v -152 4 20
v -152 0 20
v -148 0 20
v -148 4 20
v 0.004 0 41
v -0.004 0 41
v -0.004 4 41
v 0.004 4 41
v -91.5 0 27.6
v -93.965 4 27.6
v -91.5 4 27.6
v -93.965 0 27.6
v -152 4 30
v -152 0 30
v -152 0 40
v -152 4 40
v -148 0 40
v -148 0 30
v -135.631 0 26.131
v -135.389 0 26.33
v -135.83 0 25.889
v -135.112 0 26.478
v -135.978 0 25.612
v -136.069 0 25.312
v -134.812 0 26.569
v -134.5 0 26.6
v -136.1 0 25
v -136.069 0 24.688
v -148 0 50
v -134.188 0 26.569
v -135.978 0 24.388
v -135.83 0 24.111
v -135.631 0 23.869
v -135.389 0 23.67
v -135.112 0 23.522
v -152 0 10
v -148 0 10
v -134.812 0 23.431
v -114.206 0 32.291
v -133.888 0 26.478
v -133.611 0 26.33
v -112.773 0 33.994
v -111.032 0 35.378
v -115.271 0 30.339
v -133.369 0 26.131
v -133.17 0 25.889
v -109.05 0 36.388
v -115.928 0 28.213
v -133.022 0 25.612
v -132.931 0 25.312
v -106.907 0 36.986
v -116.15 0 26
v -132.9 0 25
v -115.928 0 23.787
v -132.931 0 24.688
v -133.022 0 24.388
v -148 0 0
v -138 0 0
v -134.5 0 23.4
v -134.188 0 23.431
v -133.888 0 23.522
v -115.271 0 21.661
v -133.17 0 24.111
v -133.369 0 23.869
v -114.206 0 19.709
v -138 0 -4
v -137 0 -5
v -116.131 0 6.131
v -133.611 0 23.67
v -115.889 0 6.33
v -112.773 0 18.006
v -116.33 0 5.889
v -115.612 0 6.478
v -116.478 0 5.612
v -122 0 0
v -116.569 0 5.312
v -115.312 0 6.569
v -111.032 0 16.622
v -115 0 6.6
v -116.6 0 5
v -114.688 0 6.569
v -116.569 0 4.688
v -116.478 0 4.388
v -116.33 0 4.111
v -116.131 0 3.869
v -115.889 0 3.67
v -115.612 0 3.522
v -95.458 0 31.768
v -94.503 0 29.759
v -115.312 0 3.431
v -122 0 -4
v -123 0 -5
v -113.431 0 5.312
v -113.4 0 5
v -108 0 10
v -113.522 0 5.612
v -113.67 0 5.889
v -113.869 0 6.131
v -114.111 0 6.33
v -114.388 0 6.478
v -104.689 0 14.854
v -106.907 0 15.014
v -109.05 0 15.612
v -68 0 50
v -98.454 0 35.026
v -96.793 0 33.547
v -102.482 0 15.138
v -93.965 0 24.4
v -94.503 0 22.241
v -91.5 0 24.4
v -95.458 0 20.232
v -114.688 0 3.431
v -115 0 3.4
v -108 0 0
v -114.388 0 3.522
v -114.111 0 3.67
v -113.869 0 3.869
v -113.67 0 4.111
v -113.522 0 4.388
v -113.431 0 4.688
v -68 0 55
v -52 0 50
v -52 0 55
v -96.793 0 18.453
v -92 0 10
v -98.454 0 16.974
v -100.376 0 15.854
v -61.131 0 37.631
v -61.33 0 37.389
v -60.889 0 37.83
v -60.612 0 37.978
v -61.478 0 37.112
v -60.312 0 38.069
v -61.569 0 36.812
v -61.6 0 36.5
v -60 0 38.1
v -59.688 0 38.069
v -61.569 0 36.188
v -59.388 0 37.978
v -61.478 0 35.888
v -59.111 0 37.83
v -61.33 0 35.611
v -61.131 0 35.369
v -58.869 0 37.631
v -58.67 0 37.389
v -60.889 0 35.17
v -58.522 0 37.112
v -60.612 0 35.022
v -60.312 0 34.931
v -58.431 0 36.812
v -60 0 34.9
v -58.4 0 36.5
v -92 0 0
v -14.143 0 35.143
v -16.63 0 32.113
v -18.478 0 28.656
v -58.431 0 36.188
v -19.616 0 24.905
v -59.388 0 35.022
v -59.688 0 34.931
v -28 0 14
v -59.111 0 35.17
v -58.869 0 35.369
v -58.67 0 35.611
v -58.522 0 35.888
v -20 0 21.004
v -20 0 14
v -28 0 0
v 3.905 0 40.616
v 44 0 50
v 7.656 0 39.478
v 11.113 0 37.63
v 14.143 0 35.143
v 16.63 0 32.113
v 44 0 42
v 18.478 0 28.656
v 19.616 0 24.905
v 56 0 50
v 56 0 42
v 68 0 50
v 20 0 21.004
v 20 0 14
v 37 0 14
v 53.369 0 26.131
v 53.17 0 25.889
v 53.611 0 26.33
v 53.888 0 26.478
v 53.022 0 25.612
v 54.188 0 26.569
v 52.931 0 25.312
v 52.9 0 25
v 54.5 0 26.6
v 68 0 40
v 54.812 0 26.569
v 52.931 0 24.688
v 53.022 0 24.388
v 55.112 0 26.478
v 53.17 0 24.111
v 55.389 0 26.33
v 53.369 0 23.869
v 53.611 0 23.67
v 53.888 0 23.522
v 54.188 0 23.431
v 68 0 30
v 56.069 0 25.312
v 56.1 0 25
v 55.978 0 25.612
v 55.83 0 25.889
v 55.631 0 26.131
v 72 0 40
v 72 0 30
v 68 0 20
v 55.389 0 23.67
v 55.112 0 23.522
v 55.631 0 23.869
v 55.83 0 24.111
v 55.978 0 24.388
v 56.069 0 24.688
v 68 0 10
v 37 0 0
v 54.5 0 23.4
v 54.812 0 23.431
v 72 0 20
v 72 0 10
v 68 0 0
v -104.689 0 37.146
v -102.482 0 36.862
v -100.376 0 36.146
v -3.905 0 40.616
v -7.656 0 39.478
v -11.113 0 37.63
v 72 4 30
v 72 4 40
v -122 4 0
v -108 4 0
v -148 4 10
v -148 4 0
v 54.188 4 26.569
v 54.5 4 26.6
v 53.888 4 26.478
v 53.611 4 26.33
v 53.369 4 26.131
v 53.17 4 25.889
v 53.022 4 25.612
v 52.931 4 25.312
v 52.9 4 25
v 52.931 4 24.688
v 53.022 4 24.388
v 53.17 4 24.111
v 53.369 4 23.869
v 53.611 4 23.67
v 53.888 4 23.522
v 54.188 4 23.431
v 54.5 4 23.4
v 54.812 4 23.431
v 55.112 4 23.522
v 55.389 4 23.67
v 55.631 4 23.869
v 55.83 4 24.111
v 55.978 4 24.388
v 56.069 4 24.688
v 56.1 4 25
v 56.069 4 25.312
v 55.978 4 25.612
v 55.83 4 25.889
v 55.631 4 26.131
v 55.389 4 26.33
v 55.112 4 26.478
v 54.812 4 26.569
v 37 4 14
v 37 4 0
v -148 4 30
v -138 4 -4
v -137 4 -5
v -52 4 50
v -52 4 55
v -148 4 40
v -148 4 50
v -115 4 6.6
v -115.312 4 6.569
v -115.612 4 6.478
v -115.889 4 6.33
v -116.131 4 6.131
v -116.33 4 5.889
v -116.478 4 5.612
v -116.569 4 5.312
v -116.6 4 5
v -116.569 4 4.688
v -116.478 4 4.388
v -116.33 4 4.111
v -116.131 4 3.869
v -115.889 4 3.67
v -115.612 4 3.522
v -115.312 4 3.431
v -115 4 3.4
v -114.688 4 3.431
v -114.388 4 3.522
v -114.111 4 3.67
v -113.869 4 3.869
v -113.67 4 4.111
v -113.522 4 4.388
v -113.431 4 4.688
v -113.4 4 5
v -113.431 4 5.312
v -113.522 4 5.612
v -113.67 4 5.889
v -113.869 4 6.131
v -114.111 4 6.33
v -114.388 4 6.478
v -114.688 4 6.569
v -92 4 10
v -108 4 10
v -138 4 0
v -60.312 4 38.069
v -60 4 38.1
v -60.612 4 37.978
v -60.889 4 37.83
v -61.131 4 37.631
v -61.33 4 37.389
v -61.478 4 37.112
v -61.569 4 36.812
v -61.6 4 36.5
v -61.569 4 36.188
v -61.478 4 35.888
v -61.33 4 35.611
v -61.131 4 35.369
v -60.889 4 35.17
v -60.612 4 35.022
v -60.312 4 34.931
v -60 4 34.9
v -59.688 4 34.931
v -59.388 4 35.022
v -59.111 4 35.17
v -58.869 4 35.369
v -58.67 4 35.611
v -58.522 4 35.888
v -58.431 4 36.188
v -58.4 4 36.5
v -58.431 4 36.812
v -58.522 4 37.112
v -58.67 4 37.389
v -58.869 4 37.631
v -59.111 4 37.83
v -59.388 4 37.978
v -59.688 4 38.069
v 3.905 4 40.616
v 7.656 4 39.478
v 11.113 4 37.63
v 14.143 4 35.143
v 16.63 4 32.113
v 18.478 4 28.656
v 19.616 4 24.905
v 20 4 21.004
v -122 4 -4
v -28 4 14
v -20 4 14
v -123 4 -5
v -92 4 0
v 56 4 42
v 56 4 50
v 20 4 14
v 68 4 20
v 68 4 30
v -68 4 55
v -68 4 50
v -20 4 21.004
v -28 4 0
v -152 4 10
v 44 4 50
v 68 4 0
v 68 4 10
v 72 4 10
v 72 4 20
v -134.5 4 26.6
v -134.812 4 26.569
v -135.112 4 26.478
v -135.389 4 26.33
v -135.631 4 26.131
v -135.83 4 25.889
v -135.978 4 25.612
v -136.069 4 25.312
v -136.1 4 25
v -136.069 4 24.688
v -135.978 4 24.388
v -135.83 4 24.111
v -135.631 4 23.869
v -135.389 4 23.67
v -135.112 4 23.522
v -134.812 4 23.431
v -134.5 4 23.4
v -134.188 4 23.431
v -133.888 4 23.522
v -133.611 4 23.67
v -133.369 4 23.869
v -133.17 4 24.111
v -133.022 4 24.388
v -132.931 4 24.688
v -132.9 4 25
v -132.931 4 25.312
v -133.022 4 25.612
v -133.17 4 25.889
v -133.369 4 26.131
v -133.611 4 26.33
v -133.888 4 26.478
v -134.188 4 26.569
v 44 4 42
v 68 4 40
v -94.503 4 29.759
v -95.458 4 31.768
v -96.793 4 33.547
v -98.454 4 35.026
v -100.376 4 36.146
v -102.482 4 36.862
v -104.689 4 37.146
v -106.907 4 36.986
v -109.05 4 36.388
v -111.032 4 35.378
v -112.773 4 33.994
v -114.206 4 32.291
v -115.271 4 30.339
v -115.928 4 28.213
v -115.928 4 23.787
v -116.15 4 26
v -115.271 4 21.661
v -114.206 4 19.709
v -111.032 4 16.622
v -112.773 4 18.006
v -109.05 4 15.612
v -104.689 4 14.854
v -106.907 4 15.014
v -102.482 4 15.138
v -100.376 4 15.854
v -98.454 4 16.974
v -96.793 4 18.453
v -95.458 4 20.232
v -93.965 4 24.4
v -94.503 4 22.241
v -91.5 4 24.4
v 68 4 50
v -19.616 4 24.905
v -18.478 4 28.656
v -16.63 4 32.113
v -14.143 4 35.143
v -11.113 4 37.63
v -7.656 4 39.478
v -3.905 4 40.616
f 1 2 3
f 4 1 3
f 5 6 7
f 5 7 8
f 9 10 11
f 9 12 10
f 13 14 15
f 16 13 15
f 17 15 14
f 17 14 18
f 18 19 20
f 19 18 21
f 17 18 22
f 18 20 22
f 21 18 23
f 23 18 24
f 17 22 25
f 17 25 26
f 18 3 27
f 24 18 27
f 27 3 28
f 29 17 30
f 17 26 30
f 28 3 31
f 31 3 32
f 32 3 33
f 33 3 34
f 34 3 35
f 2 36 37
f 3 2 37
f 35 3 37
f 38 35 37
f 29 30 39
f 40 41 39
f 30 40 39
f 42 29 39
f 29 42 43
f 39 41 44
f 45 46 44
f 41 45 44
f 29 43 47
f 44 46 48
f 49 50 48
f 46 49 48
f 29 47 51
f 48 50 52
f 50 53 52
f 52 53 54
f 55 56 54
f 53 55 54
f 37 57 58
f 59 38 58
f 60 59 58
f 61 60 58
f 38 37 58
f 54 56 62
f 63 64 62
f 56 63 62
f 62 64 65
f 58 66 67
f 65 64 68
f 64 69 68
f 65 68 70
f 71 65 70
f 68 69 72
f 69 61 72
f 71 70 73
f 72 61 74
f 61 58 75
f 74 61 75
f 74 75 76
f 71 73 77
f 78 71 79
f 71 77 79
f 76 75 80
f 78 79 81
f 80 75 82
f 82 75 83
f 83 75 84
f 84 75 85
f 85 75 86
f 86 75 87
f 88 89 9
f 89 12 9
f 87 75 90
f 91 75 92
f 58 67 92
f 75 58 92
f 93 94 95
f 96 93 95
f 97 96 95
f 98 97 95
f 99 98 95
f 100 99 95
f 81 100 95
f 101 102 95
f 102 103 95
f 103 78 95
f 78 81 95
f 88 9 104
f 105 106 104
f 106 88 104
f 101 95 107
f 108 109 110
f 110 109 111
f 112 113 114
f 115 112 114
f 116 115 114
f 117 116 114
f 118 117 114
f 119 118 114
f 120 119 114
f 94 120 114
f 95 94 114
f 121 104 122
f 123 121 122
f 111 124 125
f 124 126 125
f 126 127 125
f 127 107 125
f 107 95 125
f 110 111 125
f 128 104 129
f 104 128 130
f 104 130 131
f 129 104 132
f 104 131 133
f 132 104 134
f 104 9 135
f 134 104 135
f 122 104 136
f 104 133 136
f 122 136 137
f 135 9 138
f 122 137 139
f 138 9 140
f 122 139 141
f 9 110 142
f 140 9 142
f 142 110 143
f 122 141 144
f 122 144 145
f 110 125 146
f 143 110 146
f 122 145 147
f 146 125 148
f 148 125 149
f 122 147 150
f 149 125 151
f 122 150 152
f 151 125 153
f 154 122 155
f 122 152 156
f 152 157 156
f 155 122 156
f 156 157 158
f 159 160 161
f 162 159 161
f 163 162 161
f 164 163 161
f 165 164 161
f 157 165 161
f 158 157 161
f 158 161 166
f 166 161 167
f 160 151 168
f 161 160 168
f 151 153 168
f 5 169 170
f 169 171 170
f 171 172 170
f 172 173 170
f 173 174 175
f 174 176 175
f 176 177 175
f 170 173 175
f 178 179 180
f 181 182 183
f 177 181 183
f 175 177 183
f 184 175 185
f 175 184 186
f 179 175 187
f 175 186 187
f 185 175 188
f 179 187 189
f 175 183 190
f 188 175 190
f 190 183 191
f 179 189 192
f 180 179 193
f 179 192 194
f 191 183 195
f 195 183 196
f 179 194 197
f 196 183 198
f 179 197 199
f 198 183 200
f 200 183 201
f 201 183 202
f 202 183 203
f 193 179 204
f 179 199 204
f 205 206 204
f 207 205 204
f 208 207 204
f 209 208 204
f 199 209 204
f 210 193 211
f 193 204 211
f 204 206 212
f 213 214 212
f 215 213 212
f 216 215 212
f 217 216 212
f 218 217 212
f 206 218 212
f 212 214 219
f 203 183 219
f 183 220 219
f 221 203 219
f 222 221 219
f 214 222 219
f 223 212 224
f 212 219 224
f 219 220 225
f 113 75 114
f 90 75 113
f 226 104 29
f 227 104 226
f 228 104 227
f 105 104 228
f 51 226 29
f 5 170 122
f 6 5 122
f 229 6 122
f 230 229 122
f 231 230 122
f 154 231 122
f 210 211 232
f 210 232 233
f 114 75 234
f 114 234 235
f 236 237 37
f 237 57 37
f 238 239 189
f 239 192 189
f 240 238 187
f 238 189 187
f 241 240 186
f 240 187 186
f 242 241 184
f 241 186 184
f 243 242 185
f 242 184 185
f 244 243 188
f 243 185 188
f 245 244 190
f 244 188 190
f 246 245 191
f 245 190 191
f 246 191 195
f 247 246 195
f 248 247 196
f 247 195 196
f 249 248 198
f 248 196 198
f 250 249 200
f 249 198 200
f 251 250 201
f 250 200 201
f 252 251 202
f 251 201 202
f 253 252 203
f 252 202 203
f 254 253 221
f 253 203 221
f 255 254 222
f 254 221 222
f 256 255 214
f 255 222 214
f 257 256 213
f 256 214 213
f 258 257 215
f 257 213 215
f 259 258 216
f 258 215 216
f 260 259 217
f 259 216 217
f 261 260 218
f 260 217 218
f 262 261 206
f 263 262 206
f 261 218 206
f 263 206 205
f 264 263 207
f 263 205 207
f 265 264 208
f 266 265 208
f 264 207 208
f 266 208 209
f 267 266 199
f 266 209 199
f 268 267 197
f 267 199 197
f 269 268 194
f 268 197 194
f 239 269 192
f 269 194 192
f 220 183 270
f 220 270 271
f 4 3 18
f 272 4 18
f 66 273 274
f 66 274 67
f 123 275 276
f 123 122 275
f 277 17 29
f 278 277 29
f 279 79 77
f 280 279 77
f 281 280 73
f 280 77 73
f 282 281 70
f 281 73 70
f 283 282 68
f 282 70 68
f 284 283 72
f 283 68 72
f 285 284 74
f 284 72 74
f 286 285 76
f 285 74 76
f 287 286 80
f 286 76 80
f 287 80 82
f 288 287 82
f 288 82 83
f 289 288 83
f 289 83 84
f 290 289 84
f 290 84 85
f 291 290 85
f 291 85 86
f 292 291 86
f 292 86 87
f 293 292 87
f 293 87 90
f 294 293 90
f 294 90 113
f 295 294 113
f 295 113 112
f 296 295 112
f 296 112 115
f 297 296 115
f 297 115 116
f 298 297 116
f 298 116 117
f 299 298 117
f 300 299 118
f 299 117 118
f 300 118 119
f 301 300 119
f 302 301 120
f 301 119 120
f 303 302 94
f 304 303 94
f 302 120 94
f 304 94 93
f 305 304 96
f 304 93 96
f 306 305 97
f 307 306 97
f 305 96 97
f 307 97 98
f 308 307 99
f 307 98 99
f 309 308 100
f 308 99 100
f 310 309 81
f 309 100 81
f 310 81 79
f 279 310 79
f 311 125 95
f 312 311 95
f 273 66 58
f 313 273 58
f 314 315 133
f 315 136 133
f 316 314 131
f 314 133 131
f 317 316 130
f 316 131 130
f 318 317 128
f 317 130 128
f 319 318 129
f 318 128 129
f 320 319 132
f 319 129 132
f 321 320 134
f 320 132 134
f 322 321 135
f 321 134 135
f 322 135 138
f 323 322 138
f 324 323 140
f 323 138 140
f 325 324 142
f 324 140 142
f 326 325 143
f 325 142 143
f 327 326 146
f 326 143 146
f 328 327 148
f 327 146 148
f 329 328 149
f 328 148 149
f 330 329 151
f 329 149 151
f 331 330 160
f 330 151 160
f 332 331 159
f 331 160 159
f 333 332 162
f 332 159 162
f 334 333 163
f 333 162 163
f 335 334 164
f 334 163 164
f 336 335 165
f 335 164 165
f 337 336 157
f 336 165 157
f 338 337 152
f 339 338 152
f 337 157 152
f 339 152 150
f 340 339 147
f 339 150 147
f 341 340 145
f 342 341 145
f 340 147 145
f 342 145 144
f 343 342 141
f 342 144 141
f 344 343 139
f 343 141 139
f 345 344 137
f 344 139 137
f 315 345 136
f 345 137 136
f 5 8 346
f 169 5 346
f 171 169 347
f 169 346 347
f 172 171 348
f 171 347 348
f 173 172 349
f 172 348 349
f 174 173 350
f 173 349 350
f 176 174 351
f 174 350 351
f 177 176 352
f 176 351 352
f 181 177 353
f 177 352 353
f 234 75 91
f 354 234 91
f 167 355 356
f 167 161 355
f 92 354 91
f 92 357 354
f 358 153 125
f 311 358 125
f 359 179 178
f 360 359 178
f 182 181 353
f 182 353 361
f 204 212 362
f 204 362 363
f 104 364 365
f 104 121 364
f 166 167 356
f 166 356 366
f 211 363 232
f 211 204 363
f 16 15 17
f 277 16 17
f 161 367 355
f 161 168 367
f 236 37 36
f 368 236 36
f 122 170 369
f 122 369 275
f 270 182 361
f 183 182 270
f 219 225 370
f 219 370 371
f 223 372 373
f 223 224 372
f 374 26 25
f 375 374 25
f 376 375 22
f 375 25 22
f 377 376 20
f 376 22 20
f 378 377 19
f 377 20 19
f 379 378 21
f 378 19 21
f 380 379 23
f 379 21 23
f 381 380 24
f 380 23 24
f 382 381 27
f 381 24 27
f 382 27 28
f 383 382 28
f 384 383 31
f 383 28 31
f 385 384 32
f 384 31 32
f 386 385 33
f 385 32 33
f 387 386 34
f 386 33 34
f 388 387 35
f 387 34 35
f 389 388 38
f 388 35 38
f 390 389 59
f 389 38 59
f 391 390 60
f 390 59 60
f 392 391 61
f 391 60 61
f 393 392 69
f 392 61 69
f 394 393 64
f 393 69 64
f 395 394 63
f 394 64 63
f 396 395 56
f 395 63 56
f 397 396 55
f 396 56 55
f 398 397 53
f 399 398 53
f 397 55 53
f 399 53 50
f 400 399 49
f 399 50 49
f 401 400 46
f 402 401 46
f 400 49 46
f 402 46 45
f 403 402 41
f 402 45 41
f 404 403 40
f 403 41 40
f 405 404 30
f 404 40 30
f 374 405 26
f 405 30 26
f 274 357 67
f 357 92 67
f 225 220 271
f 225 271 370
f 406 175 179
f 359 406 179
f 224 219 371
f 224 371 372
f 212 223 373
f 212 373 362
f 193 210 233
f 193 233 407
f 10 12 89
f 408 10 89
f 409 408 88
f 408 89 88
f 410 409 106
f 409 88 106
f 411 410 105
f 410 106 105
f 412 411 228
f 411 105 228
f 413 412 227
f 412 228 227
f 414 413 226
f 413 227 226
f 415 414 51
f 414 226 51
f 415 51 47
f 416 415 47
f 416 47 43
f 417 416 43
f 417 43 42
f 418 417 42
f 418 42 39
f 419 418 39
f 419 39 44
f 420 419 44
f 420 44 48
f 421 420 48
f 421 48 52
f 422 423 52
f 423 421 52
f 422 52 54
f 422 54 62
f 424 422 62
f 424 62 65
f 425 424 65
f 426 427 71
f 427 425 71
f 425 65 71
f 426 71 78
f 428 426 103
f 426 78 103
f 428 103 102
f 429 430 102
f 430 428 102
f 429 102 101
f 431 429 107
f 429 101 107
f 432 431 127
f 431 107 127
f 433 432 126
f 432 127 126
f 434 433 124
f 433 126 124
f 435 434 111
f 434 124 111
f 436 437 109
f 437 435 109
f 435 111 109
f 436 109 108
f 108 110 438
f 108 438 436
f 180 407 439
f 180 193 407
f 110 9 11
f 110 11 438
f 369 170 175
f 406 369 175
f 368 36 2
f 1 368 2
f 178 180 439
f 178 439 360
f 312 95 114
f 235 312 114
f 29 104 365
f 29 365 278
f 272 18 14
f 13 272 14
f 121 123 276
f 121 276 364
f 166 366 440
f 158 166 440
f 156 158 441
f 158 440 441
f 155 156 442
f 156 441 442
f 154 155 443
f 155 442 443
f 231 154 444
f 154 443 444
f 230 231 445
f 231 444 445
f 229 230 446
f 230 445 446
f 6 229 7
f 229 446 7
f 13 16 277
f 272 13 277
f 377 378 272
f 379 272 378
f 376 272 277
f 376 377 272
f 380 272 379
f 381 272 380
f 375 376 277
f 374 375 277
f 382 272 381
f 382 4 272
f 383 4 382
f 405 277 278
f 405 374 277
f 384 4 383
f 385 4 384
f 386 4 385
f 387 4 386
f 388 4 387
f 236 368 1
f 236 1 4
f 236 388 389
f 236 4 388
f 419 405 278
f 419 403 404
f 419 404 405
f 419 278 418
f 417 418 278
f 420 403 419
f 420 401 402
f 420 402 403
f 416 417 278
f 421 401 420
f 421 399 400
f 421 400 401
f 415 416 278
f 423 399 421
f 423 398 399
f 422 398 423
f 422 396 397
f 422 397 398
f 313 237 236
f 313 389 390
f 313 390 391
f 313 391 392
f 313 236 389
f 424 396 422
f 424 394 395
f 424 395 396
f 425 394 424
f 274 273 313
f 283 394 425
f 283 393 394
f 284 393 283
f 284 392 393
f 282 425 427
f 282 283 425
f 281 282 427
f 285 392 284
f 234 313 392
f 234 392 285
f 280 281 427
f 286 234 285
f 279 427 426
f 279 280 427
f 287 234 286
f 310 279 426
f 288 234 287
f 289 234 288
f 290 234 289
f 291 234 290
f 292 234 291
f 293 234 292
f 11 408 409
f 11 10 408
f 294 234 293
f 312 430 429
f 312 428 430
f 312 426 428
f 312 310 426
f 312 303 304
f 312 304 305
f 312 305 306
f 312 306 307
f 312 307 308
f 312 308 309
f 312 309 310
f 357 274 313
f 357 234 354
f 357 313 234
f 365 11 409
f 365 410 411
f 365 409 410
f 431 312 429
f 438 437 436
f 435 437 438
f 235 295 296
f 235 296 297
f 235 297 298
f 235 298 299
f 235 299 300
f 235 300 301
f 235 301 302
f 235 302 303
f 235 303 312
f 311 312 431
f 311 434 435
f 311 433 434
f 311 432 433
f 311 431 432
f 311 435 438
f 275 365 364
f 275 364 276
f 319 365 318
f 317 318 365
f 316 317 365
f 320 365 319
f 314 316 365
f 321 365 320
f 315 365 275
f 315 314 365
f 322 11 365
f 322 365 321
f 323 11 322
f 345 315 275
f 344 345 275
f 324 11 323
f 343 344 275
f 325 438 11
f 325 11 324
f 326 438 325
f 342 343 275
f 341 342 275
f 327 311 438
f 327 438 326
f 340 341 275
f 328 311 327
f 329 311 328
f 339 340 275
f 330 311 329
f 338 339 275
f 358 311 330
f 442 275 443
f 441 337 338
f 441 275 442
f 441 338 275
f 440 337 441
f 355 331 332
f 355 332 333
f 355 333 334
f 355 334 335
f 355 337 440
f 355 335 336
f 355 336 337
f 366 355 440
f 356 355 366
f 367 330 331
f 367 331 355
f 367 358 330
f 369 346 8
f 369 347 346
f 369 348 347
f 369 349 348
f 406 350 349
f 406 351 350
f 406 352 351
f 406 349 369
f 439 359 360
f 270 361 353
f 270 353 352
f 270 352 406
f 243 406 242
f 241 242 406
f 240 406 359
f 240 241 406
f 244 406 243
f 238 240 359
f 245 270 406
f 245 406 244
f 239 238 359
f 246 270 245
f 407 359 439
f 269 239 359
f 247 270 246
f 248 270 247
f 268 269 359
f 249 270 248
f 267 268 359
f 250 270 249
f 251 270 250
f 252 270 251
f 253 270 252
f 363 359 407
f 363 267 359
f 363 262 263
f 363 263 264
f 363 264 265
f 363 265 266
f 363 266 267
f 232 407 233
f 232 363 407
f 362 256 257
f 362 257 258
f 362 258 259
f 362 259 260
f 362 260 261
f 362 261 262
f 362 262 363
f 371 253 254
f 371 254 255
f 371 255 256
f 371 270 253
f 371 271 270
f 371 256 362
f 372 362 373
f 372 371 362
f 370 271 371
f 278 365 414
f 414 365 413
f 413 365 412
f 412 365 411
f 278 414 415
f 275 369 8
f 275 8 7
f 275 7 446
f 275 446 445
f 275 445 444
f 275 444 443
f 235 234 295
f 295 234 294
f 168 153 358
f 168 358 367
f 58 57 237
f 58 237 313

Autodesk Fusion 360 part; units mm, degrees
sketch "スケッチ1" plane through (0, 0, 0) normal (0, 1, 0) x (1, 0, 0)
  line L0 (-20, -14) -> (-20, -41)
  line L1 (-20, -41) -> (20, -41)
  line L2 (20, -41) -> (20, -14)
  line L3 (20, -14) -> (37, -14)
  line L4 (37, -14) -> (37, 0)
  line L5 (37, 0) -> (68, 0)
  line L6 (68, 0) -> (68, -10)
  line L7 (68, -10) -> (72, -10)
  line L8 (72, -10) -> (72, -20)
  line L9 (72, -20) -> (68, -20)
  line L10 (68, -20) -> (68, -30)
  line L11 (68, -30) -> (72, -30)
  line L12 (72, -30) -> (72, -40)
  line L13 (72, -40) -> (68, -40)
  line L14 (68, -40) -> (68, -50)
  line L15 (68, -50) -> (-148, -50)
  line L16 (-148, 0) -> (-28, 0)
  line L17 (-148, 0) -> (-148, -10)
  line L18 (-148, -10) -> (-152, -10)
  line L19 (-152, -10) -> (-152, -20)
  line L20 (-152, -20) -> (-148, -20)
  line L21 (-148, -20) -> (-148, -30)
  line L22 (-148, -30) -> (-152, -30)
  line L23 (-152, -30) -> (-152, -40)
  line L24 (-152, -40) -> (-148, -40)
  line L25 (-148, -40) -> (-148, -50)
  line L26 (-108, 0) -> (-92, 0)
  line L27 (-92, 0) -> (-92, -10)
  line L28 (-92, -10) -> (-108, -10)
  line L29 (-108, -10) -> (-108, 0)
  line L30 (-68, -50) -> (-52, -50)
  line L31 (-52, -50) -> (-52, -55)
  line L32 (-52, -55) -> (-68, -55)
  line L33 (-68, -55) -> (-68, -50)
  line L34 (-138, 0) -> (-122, 0)
  line L35 (-122, 0) -> (-122, 5)
  line L36 (-122, 5) -> (-138, 5)
  line L37 (-138, 5) -> (-138, 0)
  circle A0 centre (-105, -26) radius 11.15
  line L38 (-93.9654, -24.4) -> (-93.9654, -27.6)
  line L39 (-93.9654, -27.6) -> (-91.5, -27.6)
  line L40 (-91.5, -27.6) -> (-91.5, -24.4)
  line L41 (-91.5, -24.4) -> (-93.9654, -24.4)
  line L42 (56, -50) -> (44, -50)
  line L43 (44, -50) -> (44, -42)
  line L44 (44, -42) -> (56, -42)
  line L45 (56, -42) -> (56, -50)
  line L46 (-28, 0) -> (-28, -14)
  line L47 (-28, -14) -> (-20, -14)
  point P0 (-100, 0)
  point P1 (-130, 0)
  point P2 (-60, -50)
  dimension "d8" = 20
  dimension "d9" = 20
  dimension "d10" = 14
  dimension "d11" = 68
  dimension "d12" = 4
  dimension "d13" = 10
  dimension "d14" = 10
  dimension "d15" = 10
  dimension "d16" = 10
  dimension "d17" = 10
  dimension "d19" = 17
  dimension "d34" = 4
  dimension "d37" = 216
  dimension "d40" = 100
  dimension "d41" = 10
  dimension "d42" = 16
  dimension "d43" = 5
  dimension "d44" = 16
  dimension "d45" = 60
  dimension "d46" = 130
  dimension "d49" = 22.3
  dimension "d51" = 3.2
  dimension "d52" = 105
  dimension "d53" = 26
  dimension "d54" = 13.5
  dimension "d56" = 12
  dimension "d57" = 8
  dimension "d58" = 12
  dimension "d59" = 41
  dimension "d60" = 8
extrude "押し出し1" add sketch "スケッチ1" along normal blind 4 contours L0 L1 L2 L3 L4 L5 L6 L7 L8 L9 L10 L11 L12 L13 L14 L15 L16 L17 L18 L19 L20 L21 L22 L23 L24 L25 L27 L28 L29 L30 L34 L43 L44 L45 L46 L47 | L16 L34 L35 L36 L37 | L15 L30 L31 L32 L33
sketch "スケッチ2" plane through (0, 4, 0) normal (0, 1, 0) x (-1, 0, 0)
  line L0 (-56, 50) -> (-68, 50)
  line L1 (-68, 50) -> (-68, 40)
  line L2 (-68, 40) -> (-72, 40)
  line L3 (-72, 40) -> (-72, 30)
  line L4 (-72, 30) -> (-68, 30)
  line L5 (-68, 30) -> (-68, 20)
  line L6 (-68, 20) -> (-72, 20)
  line L7 (-72, 20) -> (-72, 10)
  line L8 (-72, 10) -> (-68, 10)
  line L9 (-68, 10) -> (-68, 0)
  line L10 (-68, 0) -> (-37, 0)
  line L11 (-37, 0) -> (-37, 14)
  line L12 (-37, 14) -> (-20, 14)
  line L13 (-20, 14) -> (-20, 41)
  line L14 (-20, 41) -> (20, 41)
  line L15 (20, 41) -> (20, 14)
  line L16 (28, 0) -> (92, 0)
  line L17 (-54.5, 25) -> (-68, 25)
  line L18 (60, 36.5) -> (115, 5)
  line L19 (148, 0) -> (148, 10)
  line L20 (148, 10) -> (152, 10)
  line L21 (152, 10) -> (152, 20)
  line L22 (152, 20) -> (148, 20)
  line L23 (148, 20) -> (148, 30)
  line L24 (148, 30) -> (152, 30)
  line L25 (152, 30) -> (152, 40)
  line L26 (152, 40) -> (148, 40)
  line L27 (148, 40) -> (148, 50)
  line L28 (148, 25) -> (134.5, 25)
  line L29 (92, 0) -> (92, 10)
  line L30 (92, 10) -> (108, 10)
  line L31 (108, 10) -> (108, 0)
  line L32 (122, 0) -> (122, -5)
  line L33 (122, -5) -> (138, -5)
  line L34 (138, -5) -> (138, 0)
  line L35 (68, 50) -> (68, 55)
  line L36 (68, 55) -> (52, 55)
  line L37 (52, 55) -> (52, 50)
  line L38 (52, 50) -> (-44, 50)
  line L39 (108, 0) -> (122, 0)
  line L40 (93.9654, 24.4) -> (91.5, 24.4)
  line L41 (91.5, 24.4) -> (91.5, 27.6)
  line L42 (91.5, 27.6) -> (93.9654, 27.6)
  arc A0 (93.9654, 24.4) -> (93.9654, 27.6) centre (105, 26) ccw
  line L43 (-44, 50) -> (-44, 42)
  line L44 (-44, 42) -> (-56, 42)
  line L45 (-56, 42) -> (-56, 50)
  line L46 (148, 50) -> (68, 50)
  line L47 (20, 14) -> (28, 14)
  line L48 (28, 14) -> (28, 0)
  line L49 (138, 0) -> (148, 0)
  dimension "d24" = 13.5
  dimension "d25" = 5
  dimension "d27" = 13.5
  dimension "d38" = 60
  dimension "d39" = 115
hole "穴1" at (-115, 4, 5) at (-60, 4, 36.5) at (54.5, 4, 25) at (-134.5, 4, 25) direction (0, -1, 0) diameter 3.2 end through all
fillet "フィレット1" radius 20 2 edges at (20, 2, 41) (-20, 2, 41)
chamfer "面取り1" distance 1 angle 45 2 edges at (-122, 2, -5) (-138, 2, -5)
